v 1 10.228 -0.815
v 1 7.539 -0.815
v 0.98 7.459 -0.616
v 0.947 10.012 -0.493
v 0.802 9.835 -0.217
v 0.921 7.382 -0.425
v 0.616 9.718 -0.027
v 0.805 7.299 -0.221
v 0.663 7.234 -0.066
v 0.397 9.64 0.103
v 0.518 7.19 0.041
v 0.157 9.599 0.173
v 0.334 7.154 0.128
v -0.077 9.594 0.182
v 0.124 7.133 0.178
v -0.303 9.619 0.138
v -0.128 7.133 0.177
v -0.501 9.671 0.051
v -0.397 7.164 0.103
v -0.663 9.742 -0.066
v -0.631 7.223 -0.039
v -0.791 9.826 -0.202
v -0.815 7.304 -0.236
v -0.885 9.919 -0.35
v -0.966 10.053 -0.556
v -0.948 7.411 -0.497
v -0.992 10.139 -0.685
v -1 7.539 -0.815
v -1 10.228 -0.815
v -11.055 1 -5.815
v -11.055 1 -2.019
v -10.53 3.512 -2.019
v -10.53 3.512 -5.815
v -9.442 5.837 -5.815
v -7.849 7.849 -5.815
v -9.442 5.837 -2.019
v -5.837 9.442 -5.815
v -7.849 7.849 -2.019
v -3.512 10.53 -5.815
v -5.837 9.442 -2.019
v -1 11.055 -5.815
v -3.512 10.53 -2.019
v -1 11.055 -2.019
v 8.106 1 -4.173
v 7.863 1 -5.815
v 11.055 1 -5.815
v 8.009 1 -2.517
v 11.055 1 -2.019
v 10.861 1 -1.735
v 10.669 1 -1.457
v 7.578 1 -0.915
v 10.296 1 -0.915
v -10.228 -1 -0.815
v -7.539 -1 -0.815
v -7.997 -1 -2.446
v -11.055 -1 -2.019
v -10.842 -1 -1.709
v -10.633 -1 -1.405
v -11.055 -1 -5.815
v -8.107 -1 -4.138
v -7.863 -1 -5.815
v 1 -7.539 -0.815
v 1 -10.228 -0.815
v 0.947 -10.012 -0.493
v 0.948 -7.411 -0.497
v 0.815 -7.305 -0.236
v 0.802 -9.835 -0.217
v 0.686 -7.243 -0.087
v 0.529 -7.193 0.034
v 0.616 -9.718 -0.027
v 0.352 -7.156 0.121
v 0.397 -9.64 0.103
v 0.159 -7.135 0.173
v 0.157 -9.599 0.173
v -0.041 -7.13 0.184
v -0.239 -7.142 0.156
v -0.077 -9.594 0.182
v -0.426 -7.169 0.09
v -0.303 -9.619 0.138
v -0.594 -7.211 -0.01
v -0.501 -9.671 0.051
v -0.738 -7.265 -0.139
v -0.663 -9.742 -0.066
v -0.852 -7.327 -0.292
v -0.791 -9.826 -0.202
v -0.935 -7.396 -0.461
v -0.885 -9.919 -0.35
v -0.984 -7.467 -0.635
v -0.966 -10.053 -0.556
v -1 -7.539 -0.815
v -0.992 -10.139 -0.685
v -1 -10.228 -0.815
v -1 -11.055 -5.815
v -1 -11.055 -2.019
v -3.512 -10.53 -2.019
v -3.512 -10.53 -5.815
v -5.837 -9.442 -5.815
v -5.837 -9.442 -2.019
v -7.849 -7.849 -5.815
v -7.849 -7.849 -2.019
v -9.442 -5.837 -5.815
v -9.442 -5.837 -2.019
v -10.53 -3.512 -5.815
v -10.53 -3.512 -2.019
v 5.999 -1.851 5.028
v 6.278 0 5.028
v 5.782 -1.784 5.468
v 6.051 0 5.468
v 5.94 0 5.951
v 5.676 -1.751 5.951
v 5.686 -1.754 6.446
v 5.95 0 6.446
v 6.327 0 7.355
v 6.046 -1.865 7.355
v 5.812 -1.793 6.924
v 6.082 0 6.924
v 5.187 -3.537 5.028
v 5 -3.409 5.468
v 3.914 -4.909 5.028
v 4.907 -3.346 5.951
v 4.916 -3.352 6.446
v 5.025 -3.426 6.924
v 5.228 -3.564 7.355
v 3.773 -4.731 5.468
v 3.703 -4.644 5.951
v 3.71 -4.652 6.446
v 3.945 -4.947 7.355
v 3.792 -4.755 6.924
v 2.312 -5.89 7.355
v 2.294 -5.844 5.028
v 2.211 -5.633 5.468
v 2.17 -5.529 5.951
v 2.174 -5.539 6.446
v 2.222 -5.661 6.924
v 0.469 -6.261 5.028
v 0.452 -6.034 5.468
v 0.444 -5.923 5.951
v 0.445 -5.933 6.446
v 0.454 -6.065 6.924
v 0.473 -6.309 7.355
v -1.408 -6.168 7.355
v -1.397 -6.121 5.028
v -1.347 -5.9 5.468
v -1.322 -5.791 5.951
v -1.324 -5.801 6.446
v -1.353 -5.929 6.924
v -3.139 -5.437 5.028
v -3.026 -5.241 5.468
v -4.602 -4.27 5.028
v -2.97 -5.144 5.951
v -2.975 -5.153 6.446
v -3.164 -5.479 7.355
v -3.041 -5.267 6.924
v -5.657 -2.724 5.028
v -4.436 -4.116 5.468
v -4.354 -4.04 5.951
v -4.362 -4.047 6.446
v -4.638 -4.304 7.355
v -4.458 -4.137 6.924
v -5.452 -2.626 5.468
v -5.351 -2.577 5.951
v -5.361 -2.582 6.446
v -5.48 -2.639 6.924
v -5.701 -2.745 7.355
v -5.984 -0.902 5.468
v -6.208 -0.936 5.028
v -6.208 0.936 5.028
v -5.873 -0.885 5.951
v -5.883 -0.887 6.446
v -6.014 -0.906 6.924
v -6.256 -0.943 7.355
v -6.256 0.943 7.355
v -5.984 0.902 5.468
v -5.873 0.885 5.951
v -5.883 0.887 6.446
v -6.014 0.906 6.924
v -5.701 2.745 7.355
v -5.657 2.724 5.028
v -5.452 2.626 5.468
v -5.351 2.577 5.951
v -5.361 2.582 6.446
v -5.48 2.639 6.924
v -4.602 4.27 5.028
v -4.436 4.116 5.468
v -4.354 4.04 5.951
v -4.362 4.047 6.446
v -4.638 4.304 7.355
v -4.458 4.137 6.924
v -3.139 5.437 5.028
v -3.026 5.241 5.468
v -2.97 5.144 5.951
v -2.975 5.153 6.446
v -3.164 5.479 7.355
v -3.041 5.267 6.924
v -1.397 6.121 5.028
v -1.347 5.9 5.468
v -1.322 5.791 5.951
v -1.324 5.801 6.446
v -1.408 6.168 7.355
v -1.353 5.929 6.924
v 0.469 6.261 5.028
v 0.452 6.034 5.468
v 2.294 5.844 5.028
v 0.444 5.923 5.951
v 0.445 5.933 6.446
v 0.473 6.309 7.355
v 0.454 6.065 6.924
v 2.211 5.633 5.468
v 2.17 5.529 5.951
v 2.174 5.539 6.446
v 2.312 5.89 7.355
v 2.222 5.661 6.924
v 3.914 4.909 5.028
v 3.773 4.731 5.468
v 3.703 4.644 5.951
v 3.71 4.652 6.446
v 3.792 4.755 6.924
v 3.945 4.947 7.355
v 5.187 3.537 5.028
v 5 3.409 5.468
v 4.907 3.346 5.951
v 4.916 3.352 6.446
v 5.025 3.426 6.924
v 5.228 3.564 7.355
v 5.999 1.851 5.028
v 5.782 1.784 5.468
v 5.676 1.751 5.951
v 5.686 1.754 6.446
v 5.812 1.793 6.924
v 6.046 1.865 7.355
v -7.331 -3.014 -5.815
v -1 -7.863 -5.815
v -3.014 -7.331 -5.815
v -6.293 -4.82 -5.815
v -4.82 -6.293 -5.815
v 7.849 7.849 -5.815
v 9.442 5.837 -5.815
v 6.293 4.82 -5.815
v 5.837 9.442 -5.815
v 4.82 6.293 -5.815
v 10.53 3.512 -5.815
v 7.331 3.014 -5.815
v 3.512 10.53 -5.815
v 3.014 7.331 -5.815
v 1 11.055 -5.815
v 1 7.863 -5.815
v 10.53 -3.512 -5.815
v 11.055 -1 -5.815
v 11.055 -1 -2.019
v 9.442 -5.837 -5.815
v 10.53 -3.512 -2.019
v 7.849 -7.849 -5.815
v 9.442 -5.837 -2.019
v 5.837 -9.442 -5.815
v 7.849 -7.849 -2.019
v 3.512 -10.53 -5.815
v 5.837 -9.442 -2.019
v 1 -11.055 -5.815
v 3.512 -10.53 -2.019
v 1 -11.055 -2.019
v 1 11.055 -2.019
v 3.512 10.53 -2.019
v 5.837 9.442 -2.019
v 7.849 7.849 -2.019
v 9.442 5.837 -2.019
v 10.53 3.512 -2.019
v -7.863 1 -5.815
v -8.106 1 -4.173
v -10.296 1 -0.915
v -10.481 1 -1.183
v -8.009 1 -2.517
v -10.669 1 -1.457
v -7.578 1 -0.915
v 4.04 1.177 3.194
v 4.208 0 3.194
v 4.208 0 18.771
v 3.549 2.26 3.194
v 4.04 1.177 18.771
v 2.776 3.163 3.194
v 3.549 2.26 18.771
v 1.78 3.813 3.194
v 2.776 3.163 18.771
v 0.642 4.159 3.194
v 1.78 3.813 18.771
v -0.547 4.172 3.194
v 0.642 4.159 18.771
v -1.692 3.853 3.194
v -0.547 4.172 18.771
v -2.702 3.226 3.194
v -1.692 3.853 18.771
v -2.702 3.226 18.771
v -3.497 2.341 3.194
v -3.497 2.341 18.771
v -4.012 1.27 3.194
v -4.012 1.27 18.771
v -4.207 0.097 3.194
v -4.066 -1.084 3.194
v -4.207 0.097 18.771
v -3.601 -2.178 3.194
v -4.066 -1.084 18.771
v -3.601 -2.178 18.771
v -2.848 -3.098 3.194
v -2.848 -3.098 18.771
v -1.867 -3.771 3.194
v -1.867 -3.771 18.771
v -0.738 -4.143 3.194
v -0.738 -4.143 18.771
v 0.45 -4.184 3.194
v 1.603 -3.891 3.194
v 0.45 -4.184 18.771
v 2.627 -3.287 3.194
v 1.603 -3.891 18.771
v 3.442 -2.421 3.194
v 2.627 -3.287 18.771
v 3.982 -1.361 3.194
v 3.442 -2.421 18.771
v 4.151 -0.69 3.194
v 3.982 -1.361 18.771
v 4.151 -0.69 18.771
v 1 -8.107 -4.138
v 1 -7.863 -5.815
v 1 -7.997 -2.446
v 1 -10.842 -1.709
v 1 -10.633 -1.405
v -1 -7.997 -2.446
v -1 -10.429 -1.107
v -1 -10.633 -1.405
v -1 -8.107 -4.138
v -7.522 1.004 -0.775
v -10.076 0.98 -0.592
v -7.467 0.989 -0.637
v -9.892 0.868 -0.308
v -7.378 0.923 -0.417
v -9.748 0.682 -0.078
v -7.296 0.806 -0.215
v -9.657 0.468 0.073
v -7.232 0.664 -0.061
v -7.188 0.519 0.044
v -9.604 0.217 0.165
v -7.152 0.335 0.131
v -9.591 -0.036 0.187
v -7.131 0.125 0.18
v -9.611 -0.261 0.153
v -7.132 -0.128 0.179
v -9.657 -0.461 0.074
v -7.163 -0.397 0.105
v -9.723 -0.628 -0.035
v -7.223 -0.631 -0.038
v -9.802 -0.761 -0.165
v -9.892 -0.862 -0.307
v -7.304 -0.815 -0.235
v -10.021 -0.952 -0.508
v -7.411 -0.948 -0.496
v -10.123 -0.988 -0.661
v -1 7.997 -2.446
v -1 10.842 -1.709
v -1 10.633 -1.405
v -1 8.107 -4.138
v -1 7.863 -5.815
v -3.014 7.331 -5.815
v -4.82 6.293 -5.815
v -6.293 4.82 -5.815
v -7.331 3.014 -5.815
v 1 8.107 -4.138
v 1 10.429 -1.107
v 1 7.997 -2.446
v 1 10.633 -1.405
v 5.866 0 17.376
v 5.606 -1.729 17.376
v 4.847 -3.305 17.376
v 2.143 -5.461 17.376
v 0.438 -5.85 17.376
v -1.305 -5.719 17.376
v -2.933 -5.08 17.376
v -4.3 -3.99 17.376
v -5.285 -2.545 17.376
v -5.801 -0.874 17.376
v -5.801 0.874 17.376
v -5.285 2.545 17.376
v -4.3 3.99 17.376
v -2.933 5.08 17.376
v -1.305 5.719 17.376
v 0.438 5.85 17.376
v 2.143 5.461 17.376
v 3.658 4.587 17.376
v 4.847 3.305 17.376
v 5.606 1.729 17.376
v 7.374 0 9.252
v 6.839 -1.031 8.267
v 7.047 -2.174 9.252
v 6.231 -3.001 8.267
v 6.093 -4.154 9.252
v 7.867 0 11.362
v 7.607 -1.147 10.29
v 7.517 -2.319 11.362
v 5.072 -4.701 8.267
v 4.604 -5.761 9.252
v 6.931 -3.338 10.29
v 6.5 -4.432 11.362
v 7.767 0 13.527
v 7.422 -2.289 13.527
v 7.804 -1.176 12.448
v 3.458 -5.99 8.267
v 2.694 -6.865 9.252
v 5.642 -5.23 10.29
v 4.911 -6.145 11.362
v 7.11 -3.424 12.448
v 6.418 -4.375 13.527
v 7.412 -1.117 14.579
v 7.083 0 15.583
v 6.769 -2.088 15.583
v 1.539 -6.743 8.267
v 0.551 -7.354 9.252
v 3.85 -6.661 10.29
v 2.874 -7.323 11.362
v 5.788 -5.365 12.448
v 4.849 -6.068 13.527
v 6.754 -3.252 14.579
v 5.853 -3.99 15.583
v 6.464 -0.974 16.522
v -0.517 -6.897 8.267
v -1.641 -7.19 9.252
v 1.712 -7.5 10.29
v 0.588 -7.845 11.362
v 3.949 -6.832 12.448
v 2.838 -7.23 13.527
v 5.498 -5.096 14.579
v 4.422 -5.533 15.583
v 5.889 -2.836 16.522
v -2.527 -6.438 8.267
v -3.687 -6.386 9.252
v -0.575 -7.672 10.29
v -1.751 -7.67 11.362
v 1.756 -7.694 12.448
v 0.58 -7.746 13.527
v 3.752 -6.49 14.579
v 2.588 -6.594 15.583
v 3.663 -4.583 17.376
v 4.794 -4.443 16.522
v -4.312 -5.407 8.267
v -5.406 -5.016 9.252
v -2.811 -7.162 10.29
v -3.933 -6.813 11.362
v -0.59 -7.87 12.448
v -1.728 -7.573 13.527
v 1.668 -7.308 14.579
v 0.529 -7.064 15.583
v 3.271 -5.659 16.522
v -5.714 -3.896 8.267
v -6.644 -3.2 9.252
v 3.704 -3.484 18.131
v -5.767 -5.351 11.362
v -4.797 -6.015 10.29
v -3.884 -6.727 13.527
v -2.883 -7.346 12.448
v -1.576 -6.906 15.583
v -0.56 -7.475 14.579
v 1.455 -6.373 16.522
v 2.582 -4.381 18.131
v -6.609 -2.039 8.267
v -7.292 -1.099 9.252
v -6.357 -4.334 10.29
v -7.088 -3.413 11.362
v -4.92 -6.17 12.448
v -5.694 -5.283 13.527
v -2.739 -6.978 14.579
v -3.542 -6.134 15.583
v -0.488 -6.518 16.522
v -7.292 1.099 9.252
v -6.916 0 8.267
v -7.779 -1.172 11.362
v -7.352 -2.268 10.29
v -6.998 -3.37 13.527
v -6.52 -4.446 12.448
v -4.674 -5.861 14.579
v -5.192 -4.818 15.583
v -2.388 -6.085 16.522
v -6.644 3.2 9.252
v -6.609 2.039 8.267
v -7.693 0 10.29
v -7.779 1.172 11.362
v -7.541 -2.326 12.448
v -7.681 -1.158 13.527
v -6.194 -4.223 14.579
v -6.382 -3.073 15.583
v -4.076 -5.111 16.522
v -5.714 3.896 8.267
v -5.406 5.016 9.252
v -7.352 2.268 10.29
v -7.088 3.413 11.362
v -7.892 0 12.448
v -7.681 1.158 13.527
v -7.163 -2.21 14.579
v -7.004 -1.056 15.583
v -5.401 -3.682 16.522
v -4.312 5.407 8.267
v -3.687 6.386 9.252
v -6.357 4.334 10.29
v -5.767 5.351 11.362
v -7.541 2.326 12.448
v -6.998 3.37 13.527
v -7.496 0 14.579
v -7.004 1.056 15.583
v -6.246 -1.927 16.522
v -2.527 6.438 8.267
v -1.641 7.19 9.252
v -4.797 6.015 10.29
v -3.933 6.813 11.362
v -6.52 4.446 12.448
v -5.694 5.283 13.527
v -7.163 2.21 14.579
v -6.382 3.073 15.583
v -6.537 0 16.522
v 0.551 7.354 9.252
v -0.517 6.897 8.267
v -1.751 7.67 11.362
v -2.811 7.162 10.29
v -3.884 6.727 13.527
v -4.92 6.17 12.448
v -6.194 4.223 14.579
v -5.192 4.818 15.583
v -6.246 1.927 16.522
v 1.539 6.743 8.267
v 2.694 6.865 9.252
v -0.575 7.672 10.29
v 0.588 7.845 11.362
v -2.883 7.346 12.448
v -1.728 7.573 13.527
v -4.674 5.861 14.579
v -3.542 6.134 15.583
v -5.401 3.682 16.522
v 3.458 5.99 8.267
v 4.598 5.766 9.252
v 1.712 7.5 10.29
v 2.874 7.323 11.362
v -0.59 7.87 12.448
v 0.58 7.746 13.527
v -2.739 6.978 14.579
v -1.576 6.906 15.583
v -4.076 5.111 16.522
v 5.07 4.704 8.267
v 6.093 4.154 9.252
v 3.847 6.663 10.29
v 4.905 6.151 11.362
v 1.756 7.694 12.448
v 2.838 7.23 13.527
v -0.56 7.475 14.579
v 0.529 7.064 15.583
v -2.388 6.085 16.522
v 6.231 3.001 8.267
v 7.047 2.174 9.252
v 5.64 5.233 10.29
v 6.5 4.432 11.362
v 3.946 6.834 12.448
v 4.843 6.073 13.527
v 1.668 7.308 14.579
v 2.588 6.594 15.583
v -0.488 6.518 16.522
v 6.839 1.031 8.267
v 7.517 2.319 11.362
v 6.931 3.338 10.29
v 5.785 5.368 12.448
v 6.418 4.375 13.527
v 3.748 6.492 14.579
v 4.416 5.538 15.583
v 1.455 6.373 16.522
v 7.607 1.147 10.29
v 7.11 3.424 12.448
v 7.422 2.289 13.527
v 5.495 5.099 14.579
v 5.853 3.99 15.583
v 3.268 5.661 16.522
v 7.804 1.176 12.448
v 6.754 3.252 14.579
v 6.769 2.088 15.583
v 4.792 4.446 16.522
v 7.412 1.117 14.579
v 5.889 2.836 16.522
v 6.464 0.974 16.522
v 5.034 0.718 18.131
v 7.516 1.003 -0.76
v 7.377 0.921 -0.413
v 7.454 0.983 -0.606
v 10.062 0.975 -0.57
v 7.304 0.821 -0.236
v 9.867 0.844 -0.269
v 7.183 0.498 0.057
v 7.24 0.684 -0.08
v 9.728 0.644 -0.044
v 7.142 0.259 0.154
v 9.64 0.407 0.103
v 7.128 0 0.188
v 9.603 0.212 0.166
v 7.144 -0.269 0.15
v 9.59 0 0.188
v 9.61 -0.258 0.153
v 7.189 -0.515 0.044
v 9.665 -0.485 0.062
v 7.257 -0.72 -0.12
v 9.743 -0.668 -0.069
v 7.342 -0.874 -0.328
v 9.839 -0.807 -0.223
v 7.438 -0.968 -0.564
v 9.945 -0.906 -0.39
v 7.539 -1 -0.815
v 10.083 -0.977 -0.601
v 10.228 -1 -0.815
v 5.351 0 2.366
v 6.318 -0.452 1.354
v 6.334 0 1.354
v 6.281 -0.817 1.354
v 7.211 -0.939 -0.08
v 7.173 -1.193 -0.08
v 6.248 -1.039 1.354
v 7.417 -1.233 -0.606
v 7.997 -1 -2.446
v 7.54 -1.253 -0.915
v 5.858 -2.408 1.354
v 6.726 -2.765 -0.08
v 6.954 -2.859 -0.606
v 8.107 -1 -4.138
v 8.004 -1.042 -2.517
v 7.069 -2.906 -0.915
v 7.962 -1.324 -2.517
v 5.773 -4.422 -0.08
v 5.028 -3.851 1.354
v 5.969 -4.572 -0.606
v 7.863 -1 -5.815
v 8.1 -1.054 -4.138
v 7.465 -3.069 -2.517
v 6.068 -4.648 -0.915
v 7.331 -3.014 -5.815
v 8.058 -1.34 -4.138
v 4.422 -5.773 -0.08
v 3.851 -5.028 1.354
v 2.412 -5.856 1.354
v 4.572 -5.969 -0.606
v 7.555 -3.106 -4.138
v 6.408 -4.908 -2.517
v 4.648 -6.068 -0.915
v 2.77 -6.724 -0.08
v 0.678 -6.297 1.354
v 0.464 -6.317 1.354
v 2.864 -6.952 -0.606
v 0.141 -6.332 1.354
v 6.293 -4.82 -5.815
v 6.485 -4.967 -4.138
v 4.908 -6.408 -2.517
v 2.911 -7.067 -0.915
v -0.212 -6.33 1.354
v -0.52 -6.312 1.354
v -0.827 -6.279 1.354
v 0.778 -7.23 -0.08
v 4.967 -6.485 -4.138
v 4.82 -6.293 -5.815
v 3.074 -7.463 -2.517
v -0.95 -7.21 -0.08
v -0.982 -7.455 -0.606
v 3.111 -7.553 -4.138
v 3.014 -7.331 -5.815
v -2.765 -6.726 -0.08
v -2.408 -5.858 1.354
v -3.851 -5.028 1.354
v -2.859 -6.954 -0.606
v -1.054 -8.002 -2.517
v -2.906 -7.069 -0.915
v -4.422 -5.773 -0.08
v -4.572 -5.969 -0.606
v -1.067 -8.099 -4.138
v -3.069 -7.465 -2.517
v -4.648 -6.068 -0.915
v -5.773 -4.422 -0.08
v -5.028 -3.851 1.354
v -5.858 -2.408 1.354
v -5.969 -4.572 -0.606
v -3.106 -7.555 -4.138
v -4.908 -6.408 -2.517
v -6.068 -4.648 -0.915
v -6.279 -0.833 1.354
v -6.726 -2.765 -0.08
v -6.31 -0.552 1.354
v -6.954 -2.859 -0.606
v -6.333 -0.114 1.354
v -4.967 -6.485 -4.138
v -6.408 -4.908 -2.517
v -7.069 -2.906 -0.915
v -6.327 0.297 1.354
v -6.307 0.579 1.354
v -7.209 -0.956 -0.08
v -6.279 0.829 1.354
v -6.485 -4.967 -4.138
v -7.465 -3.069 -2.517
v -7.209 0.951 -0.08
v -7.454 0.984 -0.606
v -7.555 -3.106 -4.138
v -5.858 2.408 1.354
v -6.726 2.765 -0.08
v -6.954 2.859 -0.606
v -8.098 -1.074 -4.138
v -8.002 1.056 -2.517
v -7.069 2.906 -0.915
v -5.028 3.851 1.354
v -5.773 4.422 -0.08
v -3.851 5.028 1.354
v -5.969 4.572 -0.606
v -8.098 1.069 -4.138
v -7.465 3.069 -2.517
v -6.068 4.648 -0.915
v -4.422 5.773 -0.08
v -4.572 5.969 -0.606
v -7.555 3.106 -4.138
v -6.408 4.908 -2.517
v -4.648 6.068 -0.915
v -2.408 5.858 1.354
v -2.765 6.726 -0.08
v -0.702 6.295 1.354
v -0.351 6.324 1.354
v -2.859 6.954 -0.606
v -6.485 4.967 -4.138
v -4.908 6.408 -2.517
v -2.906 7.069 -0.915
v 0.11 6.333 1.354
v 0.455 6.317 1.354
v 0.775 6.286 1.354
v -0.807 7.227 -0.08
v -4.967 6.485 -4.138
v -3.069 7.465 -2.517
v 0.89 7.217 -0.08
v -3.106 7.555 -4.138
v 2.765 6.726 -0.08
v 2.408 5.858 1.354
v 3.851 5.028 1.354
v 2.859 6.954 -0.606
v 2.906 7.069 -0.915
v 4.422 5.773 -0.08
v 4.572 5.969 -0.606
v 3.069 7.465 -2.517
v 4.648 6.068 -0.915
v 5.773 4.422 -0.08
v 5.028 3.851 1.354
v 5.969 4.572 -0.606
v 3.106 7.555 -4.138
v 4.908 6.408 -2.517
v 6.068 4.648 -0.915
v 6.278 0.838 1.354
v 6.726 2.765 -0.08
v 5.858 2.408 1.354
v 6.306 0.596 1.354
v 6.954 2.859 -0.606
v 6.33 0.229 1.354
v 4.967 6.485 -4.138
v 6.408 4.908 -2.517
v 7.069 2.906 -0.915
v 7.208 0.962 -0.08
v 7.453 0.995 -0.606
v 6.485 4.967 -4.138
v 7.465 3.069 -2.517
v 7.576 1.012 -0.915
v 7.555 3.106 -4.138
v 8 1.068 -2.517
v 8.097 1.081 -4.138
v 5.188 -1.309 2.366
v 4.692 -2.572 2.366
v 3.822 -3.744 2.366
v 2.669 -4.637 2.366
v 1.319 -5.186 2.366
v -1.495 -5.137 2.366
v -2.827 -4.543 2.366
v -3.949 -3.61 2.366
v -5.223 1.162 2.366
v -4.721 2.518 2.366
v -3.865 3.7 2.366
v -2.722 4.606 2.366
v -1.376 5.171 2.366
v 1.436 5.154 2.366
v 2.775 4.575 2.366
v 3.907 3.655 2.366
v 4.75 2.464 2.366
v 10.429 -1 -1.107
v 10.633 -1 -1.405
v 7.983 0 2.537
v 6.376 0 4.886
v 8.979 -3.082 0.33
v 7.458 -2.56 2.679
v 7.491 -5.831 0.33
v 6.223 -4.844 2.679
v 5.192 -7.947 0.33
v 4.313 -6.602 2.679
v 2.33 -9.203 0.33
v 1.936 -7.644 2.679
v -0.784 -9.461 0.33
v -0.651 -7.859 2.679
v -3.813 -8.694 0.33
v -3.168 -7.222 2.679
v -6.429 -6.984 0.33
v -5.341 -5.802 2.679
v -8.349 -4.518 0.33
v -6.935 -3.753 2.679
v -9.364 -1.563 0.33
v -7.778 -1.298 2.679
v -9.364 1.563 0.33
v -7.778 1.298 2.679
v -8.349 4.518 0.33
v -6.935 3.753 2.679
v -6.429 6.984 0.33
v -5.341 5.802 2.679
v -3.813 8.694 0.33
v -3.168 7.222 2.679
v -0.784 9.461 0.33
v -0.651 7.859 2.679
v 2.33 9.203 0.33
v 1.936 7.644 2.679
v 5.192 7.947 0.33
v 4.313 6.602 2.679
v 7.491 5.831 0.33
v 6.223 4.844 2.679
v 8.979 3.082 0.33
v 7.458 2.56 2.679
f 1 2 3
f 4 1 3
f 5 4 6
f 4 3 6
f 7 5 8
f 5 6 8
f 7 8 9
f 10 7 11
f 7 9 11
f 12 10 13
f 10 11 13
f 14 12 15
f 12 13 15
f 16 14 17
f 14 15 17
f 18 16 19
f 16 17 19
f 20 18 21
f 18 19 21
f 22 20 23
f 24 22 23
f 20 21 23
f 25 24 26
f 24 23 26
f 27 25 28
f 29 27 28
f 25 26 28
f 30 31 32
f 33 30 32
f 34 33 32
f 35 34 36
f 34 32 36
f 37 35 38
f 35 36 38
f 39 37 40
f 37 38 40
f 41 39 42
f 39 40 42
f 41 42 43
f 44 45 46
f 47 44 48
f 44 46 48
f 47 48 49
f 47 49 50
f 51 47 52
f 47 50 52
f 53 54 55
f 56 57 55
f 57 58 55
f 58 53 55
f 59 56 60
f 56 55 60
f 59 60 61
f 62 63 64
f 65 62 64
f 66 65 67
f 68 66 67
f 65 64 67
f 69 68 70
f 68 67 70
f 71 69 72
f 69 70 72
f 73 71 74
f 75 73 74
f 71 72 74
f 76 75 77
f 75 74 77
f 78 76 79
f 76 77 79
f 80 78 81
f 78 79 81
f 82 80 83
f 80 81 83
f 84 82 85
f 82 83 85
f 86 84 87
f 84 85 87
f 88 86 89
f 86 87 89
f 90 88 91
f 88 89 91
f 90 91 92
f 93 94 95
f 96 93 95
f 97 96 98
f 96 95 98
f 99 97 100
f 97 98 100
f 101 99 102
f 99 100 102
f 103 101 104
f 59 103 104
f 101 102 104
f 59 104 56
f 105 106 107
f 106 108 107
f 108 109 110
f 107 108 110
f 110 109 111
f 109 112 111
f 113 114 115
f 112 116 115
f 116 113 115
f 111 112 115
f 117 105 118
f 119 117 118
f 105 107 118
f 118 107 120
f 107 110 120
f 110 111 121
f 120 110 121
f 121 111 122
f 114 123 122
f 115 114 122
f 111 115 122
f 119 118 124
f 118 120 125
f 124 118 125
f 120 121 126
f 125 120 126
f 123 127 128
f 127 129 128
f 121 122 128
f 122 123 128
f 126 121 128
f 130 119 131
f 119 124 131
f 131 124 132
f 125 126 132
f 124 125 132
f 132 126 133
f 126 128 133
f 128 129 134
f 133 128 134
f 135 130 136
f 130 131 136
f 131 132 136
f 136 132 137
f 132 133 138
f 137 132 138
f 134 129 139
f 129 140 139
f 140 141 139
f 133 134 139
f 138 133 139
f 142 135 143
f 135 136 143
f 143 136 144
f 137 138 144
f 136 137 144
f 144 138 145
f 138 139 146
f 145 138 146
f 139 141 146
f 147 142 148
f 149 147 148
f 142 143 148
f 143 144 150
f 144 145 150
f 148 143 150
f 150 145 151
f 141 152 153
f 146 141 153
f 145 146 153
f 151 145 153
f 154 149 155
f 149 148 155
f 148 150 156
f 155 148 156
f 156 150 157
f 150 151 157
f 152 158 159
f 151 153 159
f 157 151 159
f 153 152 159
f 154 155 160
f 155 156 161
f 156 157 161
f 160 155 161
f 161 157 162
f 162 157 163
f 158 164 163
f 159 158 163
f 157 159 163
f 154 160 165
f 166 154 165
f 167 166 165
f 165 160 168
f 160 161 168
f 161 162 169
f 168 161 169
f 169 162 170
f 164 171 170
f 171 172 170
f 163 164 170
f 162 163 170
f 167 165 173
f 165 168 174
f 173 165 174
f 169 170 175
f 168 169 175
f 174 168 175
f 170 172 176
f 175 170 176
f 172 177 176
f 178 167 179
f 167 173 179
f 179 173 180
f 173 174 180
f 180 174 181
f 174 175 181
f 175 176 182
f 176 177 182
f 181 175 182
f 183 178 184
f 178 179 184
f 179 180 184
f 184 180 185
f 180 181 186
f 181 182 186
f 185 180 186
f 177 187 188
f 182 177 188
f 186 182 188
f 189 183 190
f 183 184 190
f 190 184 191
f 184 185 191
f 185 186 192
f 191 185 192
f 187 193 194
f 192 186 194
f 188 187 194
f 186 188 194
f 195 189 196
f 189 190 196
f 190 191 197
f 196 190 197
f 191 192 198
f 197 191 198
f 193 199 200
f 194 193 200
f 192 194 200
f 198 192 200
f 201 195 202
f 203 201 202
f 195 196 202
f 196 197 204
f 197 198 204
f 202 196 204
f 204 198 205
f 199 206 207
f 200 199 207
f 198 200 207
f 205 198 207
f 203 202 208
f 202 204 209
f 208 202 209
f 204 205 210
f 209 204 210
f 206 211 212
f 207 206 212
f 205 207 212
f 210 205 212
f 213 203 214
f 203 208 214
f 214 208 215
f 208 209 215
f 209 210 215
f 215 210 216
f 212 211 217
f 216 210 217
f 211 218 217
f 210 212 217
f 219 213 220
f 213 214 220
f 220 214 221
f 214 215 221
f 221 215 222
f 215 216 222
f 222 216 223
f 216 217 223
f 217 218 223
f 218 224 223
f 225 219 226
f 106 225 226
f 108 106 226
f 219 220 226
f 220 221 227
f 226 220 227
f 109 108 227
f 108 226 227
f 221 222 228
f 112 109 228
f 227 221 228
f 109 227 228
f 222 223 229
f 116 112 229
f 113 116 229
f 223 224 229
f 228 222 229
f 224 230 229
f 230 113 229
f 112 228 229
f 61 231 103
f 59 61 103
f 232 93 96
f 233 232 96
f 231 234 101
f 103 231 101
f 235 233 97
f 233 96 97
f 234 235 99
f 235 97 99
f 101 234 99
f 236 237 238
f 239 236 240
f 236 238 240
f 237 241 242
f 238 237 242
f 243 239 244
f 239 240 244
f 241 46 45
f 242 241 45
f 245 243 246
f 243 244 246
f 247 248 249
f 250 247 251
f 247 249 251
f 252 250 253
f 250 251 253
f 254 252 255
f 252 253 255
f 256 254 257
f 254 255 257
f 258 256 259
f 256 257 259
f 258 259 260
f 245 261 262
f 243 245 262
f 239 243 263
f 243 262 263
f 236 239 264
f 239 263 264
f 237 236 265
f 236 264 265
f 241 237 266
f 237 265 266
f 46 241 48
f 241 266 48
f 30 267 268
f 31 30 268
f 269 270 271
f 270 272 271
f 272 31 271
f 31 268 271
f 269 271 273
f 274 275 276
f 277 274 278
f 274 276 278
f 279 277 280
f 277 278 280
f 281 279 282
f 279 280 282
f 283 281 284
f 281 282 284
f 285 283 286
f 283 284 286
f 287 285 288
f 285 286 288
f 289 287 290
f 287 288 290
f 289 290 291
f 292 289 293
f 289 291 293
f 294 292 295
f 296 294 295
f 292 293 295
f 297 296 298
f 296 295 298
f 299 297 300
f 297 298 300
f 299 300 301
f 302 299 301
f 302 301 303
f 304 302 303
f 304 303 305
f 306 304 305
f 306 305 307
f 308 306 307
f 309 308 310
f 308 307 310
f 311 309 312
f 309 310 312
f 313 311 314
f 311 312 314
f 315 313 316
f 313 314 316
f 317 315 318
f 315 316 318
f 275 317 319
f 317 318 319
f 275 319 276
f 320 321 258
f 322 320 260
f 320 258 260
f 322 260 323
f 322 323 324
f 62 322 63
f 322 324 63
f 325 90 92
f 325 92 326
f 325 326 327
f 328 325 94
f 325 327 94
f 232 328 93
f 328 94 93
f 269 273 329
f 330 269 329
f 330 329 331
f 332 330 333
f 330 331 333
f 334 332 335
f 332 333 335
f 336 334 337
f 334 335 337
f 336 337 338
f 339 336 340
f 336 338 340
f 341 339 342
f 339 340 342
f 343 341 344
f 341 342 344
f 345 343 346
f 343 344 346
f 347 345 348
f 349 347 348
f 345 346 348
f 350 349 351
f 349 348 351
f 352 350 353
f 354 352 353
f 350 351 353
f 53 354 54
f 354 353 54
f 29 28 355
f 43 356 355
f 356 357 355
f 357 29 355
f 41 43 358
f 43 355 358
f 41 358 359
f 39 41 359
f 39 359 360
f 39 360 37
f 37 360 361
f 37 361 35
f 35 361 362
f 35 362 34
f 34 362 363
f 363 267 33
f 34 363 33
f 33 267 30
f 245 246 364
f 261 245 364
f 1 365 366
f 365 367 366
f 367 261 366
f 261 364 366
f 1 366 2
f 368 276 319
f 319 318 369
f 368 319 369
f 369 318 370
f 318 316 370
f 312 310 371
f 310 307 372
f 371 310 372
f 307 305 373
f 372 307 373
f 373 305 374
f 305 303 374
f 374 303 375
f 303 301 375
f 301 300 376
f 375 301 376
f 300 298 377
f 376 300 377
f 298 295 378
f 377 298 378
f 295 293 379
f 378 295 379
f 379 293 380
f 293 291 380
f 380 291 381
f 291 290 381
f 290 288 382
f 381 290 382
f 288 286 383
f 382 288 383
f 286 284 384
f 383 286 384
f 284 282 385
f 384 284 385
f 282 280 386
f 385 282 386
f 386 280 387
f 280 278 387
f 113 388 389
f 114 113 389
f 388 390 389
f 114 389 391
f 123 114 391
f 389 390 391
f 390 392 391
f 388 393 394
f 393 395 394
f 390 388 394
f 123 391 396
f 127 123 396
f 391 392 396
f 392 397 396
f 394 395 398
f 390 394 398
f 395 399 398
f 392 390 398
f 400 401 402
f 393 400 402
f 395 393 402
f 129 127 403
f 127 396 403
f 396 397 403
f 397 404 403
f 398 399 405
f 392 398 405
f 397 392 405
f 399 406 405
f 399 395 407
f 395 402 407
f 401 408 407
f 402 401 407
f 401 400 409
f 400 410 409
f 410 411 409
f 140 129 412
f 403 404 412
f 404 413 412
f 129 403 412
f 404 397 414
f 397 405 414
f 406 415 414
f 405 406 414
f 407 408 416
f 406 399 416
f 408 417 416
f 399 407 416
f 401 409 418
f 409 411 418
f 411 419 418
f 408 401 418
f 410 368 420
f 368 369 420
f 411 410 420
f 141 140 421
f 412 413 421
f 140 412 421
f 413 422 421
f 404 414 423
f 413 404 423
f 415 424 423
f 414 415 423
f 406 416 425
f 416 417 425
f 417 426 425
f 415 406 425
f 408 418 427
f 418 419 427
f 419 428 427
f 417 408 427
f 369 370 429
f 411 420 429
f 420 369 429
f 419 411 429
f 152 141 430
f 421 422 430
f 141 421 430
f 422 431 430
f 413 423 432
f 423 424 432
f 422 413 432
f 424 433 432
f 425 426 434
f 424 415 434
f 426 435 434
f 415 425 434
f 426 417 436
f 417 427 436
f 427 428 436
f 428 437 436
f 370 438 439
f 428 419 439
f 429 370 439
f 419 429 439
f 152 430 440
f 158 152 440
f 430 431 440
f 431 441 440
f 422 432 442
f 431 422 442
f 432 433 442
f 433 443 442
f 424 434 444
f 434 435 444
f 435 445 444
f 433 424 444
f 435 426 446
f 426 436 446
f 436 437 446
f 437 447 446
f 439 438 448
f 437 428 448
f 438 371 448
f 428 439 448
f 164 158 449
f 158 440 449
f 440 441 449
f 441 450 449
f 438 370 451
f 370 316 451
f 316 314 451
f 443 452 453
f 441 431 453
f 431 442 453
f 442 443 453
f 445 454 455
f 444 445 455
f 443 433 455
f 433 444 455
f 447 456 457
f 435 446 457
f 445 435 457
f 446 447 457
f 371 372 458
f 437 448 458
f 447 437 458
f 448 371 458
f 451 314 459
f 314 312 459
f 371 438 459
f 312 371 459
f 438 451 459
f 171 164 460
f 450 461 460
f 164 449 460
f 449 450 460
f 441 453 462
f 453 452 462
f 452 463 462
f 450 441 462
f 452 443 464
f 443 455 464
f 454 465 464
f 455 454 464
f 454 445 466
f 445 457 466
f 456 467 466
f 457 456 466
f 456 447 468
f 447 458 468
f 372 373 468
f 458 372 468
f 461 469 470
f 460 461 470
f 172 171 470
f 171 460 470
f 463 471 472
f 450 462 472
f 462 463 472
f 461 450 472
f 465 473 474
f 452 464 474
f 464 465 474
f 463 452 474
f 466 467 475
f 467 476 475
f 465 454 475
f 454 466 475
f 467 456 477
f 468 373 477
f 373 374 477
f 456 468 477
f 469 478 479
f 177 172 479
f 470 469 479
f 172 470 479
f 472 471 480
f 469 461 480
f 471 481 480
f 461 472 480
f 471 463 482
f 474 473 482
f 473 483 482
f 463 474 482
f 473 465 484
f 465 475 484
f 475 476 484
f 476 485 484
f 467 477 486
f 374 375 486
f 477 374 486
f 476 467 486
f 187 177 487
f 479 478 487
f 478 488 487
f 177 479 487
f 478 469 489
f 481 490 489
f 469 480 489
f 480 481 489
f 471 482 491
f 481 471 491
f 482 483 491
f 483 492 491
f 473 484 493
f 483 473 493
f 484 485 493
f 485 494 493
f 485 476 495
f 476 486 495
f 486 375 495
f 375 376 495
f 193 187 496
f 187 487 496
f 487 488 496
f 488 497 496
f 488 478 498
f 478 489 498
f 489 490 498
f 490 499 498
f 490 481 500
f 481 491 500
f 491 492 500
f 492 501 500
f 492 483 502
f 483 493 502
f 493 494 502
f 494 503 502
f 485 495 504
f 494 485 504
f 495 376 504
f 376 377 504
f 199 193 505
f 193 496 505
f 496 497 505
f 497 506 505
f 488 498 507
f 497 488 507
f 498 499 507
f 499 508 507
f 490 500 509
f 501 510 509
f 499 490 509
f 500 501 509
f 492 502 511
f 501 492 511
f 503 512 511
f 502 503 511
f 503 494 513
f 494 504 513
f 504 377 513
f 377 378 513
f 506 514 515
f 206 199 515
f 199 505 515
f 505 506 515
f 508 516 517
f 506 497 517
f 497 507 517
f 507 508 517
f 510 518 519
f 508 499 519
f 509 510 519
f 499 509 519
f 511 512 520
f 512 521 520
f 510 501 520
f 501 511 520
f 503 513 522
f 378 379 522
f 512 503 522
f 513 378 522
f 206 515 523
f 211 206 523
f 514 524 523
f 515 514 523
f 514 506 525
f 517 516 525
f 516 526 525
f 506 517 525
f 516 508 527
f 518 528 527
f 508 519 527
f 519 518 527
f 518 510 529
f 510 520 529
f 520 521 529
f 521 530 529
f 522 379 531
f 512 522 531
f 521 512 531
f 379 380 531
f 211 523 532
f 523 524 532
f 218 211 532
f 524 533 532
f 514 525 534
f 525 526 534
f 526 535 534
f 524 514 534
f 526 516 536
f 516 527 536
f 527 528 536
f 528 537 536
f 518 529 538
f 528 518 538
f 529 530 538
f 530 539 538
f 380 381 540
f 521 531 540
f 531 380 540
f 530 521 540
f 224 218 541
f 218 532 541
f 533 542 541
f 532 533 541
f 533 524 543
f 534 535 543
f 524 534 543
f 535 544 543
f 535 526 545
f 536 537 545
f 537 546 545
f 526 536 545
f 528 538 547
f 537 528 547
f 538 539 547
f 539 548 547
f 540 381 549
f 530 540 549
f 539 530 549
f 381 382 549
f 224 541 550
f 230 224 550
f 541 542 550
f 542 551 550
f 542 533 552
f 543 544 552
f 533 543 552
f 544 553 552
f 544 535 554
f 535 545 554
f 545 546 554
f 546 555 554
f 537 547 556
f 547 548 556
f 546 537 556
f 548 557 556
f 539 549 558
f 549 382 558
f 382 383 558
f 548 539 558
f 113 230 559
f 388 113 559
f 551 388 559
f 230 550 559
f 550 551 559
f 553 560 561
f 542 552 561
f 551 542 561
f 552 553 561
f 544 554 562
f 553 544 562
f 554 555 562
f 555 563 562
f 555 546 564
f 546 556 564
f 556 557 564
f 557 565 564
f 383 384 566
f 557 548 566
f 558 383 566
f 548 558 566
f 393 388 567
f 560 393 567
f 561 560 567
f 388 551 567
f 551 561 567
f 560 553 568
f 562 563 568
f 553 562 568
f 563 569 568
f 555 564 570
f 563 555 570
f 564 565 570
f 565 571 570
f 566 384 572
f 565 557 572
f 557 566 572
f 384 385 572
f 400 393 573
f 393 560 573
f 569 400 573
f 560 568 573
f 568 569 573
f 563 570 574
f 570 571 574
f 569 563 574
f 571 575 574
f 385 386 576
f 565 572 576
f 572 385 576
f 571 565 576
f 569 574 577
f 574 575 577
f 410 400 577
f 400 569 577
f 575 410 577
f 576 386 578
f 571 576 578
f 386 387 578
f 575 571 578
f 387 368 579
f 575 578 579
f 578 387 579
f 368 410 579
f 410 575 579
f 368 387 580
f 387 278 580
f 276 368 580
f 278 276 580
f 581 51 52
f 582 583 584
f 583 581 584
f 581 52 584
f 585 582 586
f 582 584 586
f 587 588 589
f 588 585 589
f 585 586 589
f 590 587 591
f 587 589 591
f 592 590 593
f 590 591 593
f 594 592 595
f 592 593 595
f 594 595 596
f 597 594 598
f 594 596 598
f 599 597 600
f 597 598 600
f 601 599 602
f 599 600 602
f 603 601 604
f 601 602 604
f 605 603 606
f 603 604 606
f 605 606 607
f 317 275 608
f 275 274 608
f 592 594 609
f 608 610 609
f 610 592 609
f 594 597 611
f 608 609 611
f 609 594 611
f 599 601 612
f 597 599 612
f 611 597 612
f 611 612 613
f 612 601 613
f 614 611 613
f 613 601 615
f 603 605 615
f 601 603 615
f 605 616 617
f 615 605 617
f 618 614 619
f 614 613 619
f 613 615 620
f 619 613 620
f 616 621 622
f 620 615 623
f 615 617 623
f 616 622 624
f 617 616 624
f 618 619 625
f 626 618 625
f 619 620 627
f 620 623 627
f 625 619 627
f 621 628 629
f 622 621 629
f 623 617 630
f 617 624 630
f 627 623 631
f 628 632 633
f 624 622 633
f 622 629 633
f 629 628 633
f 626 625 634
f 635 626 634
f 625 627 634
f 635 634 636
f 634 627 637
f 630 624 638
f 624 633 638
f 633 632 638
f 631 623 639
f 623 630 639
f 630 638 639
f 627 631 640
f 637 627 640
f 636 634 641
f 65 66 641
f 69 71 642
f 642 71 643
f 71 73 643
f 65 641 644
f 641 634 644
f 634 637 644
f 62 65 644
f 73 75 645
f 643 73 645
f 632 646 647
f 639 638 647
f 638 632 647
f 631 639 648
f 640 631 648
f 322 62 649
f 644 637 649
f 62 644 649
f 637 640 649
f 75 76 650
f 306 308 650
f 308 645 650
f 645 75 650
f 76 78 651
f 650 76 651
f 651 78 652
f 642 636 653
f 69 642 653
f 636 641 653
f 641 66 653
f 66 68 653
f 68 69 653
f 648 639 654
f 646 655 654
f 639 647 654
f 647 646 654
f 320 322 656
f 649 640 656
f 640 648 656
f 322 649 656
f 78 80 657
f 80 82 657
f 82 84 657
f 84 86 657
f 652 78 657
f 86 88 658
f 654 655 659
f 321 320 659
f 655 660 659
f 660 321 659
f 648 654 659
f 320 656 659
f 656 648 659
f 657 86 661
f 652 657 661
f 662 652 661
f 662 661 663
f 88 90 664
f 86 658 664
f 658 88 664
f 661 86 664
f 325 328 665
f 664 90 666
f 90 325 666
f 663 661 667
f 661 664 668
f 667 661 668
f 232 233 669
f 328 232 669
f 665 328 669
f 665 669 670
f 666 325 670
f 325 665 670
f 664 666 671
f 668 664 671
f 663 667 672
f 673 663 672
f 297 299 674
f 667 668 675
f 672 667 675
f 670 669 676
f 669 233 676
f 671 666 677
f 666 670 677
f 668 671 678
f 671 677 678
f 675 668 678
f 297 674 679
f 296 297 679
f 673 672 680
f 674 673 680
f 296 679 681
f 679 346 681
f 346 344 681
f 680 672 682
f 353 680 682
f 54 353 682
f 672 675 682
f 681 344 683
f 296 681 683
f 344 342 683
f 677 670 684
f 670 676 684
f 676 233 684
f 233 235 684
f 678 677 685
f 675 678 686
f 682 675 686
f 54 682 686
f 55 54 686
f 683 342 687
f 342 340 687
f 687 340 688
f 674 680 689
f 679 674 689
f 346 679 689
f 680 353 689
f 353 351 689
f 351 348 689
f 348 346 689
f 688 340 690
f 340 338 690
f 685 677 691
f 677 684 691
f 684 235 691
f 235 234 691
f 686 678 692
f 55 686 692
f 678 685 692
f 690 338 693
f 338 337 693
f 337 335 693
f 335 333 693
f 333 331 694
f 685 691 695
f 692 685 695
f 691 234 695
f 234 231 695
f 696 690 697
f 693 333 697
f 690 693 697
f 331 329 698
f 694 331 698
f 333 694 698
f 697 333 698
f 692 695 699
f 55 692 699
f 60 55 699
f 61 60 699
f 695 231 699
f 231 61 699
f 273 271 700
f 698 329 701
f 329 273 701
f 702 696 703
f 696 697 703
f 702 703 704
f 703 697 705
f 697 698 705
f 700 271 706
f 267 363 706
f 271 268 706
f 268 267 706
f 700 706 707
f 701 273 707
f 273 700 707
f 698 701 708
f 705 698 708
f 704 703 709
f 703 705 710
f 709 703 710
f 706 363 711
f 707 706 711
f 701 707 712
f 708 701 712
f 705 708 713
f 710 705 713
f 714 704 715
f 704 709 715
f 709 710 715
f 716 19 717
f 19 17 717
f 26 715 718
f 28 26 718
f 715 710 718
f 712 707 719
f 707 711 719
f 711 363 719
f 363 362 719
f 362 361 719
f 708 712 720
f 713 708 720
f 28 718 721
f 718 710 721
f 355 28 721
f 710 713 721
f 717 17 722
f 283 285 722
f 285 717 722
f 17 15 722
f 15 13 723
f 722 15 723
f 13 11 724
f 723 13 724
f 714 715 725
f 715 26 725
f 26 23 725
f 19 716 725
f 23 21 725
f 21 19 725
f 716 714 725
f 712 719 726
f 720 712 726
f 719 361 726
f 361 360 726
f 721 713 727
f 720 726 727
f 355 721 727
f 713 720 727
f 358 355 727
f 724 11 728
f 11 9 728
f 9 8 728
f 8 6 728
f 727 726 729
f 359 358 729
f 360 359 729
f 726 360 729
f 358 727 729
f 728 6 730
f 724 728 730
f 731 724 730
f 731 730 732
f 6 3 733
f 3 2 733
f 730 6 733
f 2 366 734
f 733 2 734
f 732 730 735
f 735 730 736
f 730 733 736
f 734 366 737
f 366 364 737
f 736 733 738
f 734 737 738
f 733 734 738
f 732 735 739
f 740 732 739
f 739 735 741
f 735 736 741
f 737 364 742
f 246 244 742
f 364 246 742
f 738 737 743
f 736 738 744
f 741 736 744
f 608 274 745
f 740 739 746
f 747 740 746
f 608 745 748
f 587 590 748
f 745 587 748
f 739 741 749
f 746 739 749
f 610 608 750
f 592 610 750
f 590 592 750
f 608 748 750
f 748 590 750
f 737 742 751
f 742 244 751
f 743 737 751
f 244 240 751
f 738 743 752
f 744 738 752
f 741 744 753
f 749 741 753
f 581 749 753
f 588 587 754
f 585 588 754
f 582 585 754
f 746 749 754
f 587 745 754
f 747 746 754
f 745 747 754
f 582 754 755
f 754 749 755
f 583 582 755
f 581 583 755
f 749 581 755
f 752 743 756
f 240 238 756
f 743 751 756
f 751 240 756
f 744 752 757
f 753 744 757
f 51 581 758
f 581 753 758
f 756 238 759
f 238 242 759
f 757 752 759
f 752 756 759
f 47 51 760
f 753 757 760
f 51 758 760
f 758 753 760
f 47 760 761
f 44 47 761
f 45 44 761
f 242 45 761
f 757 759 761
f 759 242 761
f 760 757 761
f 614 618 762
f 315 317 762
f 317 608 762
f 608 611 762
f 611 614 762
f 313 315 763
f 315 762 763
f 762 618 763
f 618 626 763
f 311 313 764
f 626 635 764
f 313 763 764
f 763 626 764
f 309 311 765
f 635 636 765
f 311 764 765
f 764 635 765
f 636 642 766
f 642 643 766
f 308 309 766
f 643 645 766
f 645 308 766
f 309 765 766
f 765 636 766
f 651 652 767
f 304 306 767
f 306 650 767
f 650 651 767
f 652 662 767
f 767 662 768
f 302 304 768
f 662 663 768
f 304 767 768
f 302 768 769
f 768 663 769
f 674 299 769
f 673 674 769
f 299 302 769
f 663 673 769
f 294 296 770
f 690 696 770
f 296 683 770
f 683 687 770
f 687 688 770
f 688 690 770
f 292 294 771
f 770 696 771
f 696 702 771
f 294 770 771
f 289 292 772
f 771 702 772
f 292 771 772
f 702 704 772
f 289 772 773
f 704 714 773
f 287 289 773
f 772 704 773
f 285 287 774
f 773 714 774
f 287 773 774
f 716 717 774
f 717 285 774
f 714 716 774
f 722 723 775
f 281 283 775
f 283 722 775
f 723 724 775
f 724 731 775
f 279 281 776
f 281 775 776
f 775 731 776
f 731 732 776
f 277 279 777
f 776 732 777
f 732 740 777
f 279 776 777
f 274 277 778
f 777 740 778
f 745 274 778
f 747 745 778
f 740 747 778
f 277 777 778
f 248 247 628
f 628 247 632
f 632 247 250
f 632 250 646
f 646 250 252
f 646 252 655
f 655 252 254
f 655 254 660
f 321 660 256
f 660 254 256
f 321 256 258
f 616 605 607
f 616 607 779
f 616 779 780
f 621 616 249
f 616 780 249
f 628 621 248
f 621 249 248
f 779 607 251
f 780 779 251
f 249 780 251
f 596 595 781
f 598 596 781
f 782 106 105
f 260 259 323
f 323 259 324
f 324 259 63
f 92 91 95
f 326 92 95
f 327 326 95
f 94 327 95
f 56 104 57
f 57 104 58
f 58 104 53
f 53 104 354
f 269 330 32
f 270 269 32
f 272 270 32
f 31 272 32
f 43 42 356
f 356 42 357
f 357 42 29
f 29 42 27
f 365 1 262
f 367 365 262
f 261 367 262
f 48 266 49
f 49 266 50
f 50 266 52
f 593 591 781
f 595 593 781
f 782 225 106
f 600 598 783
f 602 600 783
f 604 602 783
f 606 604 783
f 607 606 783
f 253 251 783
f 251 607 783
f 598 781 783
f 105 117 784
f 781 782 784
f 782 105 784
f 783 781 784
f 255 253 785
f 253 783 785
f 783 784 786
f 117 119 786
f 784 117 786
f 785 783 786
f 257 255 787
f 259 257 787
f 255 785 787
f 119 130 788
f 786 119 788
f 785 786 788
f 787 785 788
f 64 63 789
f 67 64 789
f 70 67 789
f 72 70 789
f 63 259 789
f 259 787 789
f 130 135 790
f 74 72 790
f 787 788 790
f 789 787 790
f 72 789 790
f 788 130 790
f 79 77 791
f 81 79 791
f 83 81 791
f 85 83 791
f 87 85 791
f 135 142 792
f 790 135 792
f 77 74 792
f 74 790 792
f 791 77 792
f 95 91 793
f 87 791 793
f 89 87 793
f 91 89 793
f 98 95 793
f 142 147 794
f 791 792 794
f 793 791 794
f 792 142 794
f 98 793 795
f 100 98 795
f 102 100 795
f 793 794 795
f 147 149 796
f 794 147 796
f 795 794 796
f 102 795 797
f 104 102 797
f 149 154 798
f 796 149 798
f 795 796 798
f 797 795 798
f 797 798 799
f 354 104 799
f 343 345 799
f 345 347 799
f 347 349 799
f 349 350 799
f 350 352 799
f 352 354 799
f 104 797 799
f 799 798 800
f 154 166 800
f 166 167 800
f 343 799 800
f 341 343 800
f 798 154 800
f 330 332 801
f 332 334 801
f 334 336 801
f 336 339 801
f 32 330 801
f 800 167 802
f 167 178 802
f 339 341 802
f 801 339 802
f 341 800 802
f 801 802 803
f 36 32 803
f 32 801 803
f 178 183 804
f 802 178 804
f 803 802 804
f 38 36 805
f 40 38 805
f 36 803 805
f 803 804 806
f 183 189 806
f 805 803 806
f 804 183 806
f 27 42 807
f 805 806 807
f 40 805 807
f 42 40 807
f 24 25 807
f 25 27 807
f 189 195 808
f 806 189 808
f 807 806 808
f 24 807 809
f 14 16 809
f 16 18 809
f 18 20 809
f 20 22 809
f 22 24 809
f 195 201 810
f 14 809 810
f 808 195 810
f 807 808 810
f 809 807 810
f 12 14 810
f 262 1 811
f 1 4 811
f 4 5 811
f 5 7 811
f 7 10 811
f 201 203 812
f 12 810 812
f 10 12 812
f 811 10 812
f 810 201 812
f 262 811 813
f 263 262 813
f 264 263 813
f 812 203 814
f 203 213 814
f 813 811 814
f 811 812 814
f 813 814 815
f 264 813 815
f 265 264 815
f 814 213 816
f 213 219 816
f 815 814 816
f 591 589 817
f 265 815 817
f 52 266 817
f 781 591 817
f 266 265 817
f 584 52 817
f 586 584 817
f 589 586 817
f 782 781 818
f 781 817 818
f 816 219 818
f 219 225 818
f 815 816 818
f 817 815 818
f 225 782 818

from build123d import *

# Parameters (mm, degrees)
F2_R     = 4.208015
F3_DEPTH = 25
F5_DEPTH = 12.5
F7_DEPTH = 12.5


with BuildPart() as f1:
    # F0 (on Front) → F1 (revolve)
    with BuildSketch(Plane.XZ):
        with BuildLine():
            Line((0, 19.985304), (0, 4.185304))
            ThreePointArc((0, 4.185304), (0.592961, 4.207589), (1.182577, 4.274317))
            ThreePointArc((1.182577, 4.274317), (6.796412, 0.728365), (7.926577, -5.814696))
            Line((7.926577, -5.814696), (11.100425, -5.814696))
            Line((11.100425, -5.814696), (11.100425, -2.018886))
            Line((11.100425, -2.018886), (6.278364, 5.02771))
            ThreePointArc((6.278364, 5.02771), (5.92934, 6.19907), (6.327103, 7.354789))
            ThreePointArc((6.327103, 7.354789), (7.063323, 15.62359), (0, 19.985304))
        make_face()
    revolve(axis=Axis((0, 0, -0.814696), (0, 0, -1)))

    # F2 (on Top) → F3 (cut, symmetric)
    with BuildSketch(Plane.XY):
        Circle(F2_R)
    extrude(amount=F3_DEPTH, both=True, mode=Mode.SUBTRACT)

    # F4 (on Right) → F5 (cut, symmetric)
    with BuildSketch(Plane.YZ):
        with BuildLine():
            Line((-1, -5.814696), (1, -5.814696))
            Line((1, -5.814696), (1, -0.914696))
            ThreePointArc((1, -0.914696), (0.052562, 0.186553), (-1, -0.814696))
            Line((-1, -0.814696), (-1, -5.814696))
        make_face()
    extrude(amount=F5_DEPTH, both=True, mode=Mode.SUBTRACT)

    # F6 (on Front) → F7 (cut, symmetric)
    with BuildSketch(Plane.XZ):
        with BuildLine():
            Line((-1, -0.814696), (-1, -5.814696))
            Line((-1, -5.814696), (1, -5.814696))
            Line((1, -5.814696), (1, -0.814696))
            ThreePointArc((1, -0.814696), (0, 0.185304), (-1, -0.814696))
        make_face()
    extrude(amount=F7_DEPTH, both=True, mode=Mode.SUBTRACT)


solid = f1.part
